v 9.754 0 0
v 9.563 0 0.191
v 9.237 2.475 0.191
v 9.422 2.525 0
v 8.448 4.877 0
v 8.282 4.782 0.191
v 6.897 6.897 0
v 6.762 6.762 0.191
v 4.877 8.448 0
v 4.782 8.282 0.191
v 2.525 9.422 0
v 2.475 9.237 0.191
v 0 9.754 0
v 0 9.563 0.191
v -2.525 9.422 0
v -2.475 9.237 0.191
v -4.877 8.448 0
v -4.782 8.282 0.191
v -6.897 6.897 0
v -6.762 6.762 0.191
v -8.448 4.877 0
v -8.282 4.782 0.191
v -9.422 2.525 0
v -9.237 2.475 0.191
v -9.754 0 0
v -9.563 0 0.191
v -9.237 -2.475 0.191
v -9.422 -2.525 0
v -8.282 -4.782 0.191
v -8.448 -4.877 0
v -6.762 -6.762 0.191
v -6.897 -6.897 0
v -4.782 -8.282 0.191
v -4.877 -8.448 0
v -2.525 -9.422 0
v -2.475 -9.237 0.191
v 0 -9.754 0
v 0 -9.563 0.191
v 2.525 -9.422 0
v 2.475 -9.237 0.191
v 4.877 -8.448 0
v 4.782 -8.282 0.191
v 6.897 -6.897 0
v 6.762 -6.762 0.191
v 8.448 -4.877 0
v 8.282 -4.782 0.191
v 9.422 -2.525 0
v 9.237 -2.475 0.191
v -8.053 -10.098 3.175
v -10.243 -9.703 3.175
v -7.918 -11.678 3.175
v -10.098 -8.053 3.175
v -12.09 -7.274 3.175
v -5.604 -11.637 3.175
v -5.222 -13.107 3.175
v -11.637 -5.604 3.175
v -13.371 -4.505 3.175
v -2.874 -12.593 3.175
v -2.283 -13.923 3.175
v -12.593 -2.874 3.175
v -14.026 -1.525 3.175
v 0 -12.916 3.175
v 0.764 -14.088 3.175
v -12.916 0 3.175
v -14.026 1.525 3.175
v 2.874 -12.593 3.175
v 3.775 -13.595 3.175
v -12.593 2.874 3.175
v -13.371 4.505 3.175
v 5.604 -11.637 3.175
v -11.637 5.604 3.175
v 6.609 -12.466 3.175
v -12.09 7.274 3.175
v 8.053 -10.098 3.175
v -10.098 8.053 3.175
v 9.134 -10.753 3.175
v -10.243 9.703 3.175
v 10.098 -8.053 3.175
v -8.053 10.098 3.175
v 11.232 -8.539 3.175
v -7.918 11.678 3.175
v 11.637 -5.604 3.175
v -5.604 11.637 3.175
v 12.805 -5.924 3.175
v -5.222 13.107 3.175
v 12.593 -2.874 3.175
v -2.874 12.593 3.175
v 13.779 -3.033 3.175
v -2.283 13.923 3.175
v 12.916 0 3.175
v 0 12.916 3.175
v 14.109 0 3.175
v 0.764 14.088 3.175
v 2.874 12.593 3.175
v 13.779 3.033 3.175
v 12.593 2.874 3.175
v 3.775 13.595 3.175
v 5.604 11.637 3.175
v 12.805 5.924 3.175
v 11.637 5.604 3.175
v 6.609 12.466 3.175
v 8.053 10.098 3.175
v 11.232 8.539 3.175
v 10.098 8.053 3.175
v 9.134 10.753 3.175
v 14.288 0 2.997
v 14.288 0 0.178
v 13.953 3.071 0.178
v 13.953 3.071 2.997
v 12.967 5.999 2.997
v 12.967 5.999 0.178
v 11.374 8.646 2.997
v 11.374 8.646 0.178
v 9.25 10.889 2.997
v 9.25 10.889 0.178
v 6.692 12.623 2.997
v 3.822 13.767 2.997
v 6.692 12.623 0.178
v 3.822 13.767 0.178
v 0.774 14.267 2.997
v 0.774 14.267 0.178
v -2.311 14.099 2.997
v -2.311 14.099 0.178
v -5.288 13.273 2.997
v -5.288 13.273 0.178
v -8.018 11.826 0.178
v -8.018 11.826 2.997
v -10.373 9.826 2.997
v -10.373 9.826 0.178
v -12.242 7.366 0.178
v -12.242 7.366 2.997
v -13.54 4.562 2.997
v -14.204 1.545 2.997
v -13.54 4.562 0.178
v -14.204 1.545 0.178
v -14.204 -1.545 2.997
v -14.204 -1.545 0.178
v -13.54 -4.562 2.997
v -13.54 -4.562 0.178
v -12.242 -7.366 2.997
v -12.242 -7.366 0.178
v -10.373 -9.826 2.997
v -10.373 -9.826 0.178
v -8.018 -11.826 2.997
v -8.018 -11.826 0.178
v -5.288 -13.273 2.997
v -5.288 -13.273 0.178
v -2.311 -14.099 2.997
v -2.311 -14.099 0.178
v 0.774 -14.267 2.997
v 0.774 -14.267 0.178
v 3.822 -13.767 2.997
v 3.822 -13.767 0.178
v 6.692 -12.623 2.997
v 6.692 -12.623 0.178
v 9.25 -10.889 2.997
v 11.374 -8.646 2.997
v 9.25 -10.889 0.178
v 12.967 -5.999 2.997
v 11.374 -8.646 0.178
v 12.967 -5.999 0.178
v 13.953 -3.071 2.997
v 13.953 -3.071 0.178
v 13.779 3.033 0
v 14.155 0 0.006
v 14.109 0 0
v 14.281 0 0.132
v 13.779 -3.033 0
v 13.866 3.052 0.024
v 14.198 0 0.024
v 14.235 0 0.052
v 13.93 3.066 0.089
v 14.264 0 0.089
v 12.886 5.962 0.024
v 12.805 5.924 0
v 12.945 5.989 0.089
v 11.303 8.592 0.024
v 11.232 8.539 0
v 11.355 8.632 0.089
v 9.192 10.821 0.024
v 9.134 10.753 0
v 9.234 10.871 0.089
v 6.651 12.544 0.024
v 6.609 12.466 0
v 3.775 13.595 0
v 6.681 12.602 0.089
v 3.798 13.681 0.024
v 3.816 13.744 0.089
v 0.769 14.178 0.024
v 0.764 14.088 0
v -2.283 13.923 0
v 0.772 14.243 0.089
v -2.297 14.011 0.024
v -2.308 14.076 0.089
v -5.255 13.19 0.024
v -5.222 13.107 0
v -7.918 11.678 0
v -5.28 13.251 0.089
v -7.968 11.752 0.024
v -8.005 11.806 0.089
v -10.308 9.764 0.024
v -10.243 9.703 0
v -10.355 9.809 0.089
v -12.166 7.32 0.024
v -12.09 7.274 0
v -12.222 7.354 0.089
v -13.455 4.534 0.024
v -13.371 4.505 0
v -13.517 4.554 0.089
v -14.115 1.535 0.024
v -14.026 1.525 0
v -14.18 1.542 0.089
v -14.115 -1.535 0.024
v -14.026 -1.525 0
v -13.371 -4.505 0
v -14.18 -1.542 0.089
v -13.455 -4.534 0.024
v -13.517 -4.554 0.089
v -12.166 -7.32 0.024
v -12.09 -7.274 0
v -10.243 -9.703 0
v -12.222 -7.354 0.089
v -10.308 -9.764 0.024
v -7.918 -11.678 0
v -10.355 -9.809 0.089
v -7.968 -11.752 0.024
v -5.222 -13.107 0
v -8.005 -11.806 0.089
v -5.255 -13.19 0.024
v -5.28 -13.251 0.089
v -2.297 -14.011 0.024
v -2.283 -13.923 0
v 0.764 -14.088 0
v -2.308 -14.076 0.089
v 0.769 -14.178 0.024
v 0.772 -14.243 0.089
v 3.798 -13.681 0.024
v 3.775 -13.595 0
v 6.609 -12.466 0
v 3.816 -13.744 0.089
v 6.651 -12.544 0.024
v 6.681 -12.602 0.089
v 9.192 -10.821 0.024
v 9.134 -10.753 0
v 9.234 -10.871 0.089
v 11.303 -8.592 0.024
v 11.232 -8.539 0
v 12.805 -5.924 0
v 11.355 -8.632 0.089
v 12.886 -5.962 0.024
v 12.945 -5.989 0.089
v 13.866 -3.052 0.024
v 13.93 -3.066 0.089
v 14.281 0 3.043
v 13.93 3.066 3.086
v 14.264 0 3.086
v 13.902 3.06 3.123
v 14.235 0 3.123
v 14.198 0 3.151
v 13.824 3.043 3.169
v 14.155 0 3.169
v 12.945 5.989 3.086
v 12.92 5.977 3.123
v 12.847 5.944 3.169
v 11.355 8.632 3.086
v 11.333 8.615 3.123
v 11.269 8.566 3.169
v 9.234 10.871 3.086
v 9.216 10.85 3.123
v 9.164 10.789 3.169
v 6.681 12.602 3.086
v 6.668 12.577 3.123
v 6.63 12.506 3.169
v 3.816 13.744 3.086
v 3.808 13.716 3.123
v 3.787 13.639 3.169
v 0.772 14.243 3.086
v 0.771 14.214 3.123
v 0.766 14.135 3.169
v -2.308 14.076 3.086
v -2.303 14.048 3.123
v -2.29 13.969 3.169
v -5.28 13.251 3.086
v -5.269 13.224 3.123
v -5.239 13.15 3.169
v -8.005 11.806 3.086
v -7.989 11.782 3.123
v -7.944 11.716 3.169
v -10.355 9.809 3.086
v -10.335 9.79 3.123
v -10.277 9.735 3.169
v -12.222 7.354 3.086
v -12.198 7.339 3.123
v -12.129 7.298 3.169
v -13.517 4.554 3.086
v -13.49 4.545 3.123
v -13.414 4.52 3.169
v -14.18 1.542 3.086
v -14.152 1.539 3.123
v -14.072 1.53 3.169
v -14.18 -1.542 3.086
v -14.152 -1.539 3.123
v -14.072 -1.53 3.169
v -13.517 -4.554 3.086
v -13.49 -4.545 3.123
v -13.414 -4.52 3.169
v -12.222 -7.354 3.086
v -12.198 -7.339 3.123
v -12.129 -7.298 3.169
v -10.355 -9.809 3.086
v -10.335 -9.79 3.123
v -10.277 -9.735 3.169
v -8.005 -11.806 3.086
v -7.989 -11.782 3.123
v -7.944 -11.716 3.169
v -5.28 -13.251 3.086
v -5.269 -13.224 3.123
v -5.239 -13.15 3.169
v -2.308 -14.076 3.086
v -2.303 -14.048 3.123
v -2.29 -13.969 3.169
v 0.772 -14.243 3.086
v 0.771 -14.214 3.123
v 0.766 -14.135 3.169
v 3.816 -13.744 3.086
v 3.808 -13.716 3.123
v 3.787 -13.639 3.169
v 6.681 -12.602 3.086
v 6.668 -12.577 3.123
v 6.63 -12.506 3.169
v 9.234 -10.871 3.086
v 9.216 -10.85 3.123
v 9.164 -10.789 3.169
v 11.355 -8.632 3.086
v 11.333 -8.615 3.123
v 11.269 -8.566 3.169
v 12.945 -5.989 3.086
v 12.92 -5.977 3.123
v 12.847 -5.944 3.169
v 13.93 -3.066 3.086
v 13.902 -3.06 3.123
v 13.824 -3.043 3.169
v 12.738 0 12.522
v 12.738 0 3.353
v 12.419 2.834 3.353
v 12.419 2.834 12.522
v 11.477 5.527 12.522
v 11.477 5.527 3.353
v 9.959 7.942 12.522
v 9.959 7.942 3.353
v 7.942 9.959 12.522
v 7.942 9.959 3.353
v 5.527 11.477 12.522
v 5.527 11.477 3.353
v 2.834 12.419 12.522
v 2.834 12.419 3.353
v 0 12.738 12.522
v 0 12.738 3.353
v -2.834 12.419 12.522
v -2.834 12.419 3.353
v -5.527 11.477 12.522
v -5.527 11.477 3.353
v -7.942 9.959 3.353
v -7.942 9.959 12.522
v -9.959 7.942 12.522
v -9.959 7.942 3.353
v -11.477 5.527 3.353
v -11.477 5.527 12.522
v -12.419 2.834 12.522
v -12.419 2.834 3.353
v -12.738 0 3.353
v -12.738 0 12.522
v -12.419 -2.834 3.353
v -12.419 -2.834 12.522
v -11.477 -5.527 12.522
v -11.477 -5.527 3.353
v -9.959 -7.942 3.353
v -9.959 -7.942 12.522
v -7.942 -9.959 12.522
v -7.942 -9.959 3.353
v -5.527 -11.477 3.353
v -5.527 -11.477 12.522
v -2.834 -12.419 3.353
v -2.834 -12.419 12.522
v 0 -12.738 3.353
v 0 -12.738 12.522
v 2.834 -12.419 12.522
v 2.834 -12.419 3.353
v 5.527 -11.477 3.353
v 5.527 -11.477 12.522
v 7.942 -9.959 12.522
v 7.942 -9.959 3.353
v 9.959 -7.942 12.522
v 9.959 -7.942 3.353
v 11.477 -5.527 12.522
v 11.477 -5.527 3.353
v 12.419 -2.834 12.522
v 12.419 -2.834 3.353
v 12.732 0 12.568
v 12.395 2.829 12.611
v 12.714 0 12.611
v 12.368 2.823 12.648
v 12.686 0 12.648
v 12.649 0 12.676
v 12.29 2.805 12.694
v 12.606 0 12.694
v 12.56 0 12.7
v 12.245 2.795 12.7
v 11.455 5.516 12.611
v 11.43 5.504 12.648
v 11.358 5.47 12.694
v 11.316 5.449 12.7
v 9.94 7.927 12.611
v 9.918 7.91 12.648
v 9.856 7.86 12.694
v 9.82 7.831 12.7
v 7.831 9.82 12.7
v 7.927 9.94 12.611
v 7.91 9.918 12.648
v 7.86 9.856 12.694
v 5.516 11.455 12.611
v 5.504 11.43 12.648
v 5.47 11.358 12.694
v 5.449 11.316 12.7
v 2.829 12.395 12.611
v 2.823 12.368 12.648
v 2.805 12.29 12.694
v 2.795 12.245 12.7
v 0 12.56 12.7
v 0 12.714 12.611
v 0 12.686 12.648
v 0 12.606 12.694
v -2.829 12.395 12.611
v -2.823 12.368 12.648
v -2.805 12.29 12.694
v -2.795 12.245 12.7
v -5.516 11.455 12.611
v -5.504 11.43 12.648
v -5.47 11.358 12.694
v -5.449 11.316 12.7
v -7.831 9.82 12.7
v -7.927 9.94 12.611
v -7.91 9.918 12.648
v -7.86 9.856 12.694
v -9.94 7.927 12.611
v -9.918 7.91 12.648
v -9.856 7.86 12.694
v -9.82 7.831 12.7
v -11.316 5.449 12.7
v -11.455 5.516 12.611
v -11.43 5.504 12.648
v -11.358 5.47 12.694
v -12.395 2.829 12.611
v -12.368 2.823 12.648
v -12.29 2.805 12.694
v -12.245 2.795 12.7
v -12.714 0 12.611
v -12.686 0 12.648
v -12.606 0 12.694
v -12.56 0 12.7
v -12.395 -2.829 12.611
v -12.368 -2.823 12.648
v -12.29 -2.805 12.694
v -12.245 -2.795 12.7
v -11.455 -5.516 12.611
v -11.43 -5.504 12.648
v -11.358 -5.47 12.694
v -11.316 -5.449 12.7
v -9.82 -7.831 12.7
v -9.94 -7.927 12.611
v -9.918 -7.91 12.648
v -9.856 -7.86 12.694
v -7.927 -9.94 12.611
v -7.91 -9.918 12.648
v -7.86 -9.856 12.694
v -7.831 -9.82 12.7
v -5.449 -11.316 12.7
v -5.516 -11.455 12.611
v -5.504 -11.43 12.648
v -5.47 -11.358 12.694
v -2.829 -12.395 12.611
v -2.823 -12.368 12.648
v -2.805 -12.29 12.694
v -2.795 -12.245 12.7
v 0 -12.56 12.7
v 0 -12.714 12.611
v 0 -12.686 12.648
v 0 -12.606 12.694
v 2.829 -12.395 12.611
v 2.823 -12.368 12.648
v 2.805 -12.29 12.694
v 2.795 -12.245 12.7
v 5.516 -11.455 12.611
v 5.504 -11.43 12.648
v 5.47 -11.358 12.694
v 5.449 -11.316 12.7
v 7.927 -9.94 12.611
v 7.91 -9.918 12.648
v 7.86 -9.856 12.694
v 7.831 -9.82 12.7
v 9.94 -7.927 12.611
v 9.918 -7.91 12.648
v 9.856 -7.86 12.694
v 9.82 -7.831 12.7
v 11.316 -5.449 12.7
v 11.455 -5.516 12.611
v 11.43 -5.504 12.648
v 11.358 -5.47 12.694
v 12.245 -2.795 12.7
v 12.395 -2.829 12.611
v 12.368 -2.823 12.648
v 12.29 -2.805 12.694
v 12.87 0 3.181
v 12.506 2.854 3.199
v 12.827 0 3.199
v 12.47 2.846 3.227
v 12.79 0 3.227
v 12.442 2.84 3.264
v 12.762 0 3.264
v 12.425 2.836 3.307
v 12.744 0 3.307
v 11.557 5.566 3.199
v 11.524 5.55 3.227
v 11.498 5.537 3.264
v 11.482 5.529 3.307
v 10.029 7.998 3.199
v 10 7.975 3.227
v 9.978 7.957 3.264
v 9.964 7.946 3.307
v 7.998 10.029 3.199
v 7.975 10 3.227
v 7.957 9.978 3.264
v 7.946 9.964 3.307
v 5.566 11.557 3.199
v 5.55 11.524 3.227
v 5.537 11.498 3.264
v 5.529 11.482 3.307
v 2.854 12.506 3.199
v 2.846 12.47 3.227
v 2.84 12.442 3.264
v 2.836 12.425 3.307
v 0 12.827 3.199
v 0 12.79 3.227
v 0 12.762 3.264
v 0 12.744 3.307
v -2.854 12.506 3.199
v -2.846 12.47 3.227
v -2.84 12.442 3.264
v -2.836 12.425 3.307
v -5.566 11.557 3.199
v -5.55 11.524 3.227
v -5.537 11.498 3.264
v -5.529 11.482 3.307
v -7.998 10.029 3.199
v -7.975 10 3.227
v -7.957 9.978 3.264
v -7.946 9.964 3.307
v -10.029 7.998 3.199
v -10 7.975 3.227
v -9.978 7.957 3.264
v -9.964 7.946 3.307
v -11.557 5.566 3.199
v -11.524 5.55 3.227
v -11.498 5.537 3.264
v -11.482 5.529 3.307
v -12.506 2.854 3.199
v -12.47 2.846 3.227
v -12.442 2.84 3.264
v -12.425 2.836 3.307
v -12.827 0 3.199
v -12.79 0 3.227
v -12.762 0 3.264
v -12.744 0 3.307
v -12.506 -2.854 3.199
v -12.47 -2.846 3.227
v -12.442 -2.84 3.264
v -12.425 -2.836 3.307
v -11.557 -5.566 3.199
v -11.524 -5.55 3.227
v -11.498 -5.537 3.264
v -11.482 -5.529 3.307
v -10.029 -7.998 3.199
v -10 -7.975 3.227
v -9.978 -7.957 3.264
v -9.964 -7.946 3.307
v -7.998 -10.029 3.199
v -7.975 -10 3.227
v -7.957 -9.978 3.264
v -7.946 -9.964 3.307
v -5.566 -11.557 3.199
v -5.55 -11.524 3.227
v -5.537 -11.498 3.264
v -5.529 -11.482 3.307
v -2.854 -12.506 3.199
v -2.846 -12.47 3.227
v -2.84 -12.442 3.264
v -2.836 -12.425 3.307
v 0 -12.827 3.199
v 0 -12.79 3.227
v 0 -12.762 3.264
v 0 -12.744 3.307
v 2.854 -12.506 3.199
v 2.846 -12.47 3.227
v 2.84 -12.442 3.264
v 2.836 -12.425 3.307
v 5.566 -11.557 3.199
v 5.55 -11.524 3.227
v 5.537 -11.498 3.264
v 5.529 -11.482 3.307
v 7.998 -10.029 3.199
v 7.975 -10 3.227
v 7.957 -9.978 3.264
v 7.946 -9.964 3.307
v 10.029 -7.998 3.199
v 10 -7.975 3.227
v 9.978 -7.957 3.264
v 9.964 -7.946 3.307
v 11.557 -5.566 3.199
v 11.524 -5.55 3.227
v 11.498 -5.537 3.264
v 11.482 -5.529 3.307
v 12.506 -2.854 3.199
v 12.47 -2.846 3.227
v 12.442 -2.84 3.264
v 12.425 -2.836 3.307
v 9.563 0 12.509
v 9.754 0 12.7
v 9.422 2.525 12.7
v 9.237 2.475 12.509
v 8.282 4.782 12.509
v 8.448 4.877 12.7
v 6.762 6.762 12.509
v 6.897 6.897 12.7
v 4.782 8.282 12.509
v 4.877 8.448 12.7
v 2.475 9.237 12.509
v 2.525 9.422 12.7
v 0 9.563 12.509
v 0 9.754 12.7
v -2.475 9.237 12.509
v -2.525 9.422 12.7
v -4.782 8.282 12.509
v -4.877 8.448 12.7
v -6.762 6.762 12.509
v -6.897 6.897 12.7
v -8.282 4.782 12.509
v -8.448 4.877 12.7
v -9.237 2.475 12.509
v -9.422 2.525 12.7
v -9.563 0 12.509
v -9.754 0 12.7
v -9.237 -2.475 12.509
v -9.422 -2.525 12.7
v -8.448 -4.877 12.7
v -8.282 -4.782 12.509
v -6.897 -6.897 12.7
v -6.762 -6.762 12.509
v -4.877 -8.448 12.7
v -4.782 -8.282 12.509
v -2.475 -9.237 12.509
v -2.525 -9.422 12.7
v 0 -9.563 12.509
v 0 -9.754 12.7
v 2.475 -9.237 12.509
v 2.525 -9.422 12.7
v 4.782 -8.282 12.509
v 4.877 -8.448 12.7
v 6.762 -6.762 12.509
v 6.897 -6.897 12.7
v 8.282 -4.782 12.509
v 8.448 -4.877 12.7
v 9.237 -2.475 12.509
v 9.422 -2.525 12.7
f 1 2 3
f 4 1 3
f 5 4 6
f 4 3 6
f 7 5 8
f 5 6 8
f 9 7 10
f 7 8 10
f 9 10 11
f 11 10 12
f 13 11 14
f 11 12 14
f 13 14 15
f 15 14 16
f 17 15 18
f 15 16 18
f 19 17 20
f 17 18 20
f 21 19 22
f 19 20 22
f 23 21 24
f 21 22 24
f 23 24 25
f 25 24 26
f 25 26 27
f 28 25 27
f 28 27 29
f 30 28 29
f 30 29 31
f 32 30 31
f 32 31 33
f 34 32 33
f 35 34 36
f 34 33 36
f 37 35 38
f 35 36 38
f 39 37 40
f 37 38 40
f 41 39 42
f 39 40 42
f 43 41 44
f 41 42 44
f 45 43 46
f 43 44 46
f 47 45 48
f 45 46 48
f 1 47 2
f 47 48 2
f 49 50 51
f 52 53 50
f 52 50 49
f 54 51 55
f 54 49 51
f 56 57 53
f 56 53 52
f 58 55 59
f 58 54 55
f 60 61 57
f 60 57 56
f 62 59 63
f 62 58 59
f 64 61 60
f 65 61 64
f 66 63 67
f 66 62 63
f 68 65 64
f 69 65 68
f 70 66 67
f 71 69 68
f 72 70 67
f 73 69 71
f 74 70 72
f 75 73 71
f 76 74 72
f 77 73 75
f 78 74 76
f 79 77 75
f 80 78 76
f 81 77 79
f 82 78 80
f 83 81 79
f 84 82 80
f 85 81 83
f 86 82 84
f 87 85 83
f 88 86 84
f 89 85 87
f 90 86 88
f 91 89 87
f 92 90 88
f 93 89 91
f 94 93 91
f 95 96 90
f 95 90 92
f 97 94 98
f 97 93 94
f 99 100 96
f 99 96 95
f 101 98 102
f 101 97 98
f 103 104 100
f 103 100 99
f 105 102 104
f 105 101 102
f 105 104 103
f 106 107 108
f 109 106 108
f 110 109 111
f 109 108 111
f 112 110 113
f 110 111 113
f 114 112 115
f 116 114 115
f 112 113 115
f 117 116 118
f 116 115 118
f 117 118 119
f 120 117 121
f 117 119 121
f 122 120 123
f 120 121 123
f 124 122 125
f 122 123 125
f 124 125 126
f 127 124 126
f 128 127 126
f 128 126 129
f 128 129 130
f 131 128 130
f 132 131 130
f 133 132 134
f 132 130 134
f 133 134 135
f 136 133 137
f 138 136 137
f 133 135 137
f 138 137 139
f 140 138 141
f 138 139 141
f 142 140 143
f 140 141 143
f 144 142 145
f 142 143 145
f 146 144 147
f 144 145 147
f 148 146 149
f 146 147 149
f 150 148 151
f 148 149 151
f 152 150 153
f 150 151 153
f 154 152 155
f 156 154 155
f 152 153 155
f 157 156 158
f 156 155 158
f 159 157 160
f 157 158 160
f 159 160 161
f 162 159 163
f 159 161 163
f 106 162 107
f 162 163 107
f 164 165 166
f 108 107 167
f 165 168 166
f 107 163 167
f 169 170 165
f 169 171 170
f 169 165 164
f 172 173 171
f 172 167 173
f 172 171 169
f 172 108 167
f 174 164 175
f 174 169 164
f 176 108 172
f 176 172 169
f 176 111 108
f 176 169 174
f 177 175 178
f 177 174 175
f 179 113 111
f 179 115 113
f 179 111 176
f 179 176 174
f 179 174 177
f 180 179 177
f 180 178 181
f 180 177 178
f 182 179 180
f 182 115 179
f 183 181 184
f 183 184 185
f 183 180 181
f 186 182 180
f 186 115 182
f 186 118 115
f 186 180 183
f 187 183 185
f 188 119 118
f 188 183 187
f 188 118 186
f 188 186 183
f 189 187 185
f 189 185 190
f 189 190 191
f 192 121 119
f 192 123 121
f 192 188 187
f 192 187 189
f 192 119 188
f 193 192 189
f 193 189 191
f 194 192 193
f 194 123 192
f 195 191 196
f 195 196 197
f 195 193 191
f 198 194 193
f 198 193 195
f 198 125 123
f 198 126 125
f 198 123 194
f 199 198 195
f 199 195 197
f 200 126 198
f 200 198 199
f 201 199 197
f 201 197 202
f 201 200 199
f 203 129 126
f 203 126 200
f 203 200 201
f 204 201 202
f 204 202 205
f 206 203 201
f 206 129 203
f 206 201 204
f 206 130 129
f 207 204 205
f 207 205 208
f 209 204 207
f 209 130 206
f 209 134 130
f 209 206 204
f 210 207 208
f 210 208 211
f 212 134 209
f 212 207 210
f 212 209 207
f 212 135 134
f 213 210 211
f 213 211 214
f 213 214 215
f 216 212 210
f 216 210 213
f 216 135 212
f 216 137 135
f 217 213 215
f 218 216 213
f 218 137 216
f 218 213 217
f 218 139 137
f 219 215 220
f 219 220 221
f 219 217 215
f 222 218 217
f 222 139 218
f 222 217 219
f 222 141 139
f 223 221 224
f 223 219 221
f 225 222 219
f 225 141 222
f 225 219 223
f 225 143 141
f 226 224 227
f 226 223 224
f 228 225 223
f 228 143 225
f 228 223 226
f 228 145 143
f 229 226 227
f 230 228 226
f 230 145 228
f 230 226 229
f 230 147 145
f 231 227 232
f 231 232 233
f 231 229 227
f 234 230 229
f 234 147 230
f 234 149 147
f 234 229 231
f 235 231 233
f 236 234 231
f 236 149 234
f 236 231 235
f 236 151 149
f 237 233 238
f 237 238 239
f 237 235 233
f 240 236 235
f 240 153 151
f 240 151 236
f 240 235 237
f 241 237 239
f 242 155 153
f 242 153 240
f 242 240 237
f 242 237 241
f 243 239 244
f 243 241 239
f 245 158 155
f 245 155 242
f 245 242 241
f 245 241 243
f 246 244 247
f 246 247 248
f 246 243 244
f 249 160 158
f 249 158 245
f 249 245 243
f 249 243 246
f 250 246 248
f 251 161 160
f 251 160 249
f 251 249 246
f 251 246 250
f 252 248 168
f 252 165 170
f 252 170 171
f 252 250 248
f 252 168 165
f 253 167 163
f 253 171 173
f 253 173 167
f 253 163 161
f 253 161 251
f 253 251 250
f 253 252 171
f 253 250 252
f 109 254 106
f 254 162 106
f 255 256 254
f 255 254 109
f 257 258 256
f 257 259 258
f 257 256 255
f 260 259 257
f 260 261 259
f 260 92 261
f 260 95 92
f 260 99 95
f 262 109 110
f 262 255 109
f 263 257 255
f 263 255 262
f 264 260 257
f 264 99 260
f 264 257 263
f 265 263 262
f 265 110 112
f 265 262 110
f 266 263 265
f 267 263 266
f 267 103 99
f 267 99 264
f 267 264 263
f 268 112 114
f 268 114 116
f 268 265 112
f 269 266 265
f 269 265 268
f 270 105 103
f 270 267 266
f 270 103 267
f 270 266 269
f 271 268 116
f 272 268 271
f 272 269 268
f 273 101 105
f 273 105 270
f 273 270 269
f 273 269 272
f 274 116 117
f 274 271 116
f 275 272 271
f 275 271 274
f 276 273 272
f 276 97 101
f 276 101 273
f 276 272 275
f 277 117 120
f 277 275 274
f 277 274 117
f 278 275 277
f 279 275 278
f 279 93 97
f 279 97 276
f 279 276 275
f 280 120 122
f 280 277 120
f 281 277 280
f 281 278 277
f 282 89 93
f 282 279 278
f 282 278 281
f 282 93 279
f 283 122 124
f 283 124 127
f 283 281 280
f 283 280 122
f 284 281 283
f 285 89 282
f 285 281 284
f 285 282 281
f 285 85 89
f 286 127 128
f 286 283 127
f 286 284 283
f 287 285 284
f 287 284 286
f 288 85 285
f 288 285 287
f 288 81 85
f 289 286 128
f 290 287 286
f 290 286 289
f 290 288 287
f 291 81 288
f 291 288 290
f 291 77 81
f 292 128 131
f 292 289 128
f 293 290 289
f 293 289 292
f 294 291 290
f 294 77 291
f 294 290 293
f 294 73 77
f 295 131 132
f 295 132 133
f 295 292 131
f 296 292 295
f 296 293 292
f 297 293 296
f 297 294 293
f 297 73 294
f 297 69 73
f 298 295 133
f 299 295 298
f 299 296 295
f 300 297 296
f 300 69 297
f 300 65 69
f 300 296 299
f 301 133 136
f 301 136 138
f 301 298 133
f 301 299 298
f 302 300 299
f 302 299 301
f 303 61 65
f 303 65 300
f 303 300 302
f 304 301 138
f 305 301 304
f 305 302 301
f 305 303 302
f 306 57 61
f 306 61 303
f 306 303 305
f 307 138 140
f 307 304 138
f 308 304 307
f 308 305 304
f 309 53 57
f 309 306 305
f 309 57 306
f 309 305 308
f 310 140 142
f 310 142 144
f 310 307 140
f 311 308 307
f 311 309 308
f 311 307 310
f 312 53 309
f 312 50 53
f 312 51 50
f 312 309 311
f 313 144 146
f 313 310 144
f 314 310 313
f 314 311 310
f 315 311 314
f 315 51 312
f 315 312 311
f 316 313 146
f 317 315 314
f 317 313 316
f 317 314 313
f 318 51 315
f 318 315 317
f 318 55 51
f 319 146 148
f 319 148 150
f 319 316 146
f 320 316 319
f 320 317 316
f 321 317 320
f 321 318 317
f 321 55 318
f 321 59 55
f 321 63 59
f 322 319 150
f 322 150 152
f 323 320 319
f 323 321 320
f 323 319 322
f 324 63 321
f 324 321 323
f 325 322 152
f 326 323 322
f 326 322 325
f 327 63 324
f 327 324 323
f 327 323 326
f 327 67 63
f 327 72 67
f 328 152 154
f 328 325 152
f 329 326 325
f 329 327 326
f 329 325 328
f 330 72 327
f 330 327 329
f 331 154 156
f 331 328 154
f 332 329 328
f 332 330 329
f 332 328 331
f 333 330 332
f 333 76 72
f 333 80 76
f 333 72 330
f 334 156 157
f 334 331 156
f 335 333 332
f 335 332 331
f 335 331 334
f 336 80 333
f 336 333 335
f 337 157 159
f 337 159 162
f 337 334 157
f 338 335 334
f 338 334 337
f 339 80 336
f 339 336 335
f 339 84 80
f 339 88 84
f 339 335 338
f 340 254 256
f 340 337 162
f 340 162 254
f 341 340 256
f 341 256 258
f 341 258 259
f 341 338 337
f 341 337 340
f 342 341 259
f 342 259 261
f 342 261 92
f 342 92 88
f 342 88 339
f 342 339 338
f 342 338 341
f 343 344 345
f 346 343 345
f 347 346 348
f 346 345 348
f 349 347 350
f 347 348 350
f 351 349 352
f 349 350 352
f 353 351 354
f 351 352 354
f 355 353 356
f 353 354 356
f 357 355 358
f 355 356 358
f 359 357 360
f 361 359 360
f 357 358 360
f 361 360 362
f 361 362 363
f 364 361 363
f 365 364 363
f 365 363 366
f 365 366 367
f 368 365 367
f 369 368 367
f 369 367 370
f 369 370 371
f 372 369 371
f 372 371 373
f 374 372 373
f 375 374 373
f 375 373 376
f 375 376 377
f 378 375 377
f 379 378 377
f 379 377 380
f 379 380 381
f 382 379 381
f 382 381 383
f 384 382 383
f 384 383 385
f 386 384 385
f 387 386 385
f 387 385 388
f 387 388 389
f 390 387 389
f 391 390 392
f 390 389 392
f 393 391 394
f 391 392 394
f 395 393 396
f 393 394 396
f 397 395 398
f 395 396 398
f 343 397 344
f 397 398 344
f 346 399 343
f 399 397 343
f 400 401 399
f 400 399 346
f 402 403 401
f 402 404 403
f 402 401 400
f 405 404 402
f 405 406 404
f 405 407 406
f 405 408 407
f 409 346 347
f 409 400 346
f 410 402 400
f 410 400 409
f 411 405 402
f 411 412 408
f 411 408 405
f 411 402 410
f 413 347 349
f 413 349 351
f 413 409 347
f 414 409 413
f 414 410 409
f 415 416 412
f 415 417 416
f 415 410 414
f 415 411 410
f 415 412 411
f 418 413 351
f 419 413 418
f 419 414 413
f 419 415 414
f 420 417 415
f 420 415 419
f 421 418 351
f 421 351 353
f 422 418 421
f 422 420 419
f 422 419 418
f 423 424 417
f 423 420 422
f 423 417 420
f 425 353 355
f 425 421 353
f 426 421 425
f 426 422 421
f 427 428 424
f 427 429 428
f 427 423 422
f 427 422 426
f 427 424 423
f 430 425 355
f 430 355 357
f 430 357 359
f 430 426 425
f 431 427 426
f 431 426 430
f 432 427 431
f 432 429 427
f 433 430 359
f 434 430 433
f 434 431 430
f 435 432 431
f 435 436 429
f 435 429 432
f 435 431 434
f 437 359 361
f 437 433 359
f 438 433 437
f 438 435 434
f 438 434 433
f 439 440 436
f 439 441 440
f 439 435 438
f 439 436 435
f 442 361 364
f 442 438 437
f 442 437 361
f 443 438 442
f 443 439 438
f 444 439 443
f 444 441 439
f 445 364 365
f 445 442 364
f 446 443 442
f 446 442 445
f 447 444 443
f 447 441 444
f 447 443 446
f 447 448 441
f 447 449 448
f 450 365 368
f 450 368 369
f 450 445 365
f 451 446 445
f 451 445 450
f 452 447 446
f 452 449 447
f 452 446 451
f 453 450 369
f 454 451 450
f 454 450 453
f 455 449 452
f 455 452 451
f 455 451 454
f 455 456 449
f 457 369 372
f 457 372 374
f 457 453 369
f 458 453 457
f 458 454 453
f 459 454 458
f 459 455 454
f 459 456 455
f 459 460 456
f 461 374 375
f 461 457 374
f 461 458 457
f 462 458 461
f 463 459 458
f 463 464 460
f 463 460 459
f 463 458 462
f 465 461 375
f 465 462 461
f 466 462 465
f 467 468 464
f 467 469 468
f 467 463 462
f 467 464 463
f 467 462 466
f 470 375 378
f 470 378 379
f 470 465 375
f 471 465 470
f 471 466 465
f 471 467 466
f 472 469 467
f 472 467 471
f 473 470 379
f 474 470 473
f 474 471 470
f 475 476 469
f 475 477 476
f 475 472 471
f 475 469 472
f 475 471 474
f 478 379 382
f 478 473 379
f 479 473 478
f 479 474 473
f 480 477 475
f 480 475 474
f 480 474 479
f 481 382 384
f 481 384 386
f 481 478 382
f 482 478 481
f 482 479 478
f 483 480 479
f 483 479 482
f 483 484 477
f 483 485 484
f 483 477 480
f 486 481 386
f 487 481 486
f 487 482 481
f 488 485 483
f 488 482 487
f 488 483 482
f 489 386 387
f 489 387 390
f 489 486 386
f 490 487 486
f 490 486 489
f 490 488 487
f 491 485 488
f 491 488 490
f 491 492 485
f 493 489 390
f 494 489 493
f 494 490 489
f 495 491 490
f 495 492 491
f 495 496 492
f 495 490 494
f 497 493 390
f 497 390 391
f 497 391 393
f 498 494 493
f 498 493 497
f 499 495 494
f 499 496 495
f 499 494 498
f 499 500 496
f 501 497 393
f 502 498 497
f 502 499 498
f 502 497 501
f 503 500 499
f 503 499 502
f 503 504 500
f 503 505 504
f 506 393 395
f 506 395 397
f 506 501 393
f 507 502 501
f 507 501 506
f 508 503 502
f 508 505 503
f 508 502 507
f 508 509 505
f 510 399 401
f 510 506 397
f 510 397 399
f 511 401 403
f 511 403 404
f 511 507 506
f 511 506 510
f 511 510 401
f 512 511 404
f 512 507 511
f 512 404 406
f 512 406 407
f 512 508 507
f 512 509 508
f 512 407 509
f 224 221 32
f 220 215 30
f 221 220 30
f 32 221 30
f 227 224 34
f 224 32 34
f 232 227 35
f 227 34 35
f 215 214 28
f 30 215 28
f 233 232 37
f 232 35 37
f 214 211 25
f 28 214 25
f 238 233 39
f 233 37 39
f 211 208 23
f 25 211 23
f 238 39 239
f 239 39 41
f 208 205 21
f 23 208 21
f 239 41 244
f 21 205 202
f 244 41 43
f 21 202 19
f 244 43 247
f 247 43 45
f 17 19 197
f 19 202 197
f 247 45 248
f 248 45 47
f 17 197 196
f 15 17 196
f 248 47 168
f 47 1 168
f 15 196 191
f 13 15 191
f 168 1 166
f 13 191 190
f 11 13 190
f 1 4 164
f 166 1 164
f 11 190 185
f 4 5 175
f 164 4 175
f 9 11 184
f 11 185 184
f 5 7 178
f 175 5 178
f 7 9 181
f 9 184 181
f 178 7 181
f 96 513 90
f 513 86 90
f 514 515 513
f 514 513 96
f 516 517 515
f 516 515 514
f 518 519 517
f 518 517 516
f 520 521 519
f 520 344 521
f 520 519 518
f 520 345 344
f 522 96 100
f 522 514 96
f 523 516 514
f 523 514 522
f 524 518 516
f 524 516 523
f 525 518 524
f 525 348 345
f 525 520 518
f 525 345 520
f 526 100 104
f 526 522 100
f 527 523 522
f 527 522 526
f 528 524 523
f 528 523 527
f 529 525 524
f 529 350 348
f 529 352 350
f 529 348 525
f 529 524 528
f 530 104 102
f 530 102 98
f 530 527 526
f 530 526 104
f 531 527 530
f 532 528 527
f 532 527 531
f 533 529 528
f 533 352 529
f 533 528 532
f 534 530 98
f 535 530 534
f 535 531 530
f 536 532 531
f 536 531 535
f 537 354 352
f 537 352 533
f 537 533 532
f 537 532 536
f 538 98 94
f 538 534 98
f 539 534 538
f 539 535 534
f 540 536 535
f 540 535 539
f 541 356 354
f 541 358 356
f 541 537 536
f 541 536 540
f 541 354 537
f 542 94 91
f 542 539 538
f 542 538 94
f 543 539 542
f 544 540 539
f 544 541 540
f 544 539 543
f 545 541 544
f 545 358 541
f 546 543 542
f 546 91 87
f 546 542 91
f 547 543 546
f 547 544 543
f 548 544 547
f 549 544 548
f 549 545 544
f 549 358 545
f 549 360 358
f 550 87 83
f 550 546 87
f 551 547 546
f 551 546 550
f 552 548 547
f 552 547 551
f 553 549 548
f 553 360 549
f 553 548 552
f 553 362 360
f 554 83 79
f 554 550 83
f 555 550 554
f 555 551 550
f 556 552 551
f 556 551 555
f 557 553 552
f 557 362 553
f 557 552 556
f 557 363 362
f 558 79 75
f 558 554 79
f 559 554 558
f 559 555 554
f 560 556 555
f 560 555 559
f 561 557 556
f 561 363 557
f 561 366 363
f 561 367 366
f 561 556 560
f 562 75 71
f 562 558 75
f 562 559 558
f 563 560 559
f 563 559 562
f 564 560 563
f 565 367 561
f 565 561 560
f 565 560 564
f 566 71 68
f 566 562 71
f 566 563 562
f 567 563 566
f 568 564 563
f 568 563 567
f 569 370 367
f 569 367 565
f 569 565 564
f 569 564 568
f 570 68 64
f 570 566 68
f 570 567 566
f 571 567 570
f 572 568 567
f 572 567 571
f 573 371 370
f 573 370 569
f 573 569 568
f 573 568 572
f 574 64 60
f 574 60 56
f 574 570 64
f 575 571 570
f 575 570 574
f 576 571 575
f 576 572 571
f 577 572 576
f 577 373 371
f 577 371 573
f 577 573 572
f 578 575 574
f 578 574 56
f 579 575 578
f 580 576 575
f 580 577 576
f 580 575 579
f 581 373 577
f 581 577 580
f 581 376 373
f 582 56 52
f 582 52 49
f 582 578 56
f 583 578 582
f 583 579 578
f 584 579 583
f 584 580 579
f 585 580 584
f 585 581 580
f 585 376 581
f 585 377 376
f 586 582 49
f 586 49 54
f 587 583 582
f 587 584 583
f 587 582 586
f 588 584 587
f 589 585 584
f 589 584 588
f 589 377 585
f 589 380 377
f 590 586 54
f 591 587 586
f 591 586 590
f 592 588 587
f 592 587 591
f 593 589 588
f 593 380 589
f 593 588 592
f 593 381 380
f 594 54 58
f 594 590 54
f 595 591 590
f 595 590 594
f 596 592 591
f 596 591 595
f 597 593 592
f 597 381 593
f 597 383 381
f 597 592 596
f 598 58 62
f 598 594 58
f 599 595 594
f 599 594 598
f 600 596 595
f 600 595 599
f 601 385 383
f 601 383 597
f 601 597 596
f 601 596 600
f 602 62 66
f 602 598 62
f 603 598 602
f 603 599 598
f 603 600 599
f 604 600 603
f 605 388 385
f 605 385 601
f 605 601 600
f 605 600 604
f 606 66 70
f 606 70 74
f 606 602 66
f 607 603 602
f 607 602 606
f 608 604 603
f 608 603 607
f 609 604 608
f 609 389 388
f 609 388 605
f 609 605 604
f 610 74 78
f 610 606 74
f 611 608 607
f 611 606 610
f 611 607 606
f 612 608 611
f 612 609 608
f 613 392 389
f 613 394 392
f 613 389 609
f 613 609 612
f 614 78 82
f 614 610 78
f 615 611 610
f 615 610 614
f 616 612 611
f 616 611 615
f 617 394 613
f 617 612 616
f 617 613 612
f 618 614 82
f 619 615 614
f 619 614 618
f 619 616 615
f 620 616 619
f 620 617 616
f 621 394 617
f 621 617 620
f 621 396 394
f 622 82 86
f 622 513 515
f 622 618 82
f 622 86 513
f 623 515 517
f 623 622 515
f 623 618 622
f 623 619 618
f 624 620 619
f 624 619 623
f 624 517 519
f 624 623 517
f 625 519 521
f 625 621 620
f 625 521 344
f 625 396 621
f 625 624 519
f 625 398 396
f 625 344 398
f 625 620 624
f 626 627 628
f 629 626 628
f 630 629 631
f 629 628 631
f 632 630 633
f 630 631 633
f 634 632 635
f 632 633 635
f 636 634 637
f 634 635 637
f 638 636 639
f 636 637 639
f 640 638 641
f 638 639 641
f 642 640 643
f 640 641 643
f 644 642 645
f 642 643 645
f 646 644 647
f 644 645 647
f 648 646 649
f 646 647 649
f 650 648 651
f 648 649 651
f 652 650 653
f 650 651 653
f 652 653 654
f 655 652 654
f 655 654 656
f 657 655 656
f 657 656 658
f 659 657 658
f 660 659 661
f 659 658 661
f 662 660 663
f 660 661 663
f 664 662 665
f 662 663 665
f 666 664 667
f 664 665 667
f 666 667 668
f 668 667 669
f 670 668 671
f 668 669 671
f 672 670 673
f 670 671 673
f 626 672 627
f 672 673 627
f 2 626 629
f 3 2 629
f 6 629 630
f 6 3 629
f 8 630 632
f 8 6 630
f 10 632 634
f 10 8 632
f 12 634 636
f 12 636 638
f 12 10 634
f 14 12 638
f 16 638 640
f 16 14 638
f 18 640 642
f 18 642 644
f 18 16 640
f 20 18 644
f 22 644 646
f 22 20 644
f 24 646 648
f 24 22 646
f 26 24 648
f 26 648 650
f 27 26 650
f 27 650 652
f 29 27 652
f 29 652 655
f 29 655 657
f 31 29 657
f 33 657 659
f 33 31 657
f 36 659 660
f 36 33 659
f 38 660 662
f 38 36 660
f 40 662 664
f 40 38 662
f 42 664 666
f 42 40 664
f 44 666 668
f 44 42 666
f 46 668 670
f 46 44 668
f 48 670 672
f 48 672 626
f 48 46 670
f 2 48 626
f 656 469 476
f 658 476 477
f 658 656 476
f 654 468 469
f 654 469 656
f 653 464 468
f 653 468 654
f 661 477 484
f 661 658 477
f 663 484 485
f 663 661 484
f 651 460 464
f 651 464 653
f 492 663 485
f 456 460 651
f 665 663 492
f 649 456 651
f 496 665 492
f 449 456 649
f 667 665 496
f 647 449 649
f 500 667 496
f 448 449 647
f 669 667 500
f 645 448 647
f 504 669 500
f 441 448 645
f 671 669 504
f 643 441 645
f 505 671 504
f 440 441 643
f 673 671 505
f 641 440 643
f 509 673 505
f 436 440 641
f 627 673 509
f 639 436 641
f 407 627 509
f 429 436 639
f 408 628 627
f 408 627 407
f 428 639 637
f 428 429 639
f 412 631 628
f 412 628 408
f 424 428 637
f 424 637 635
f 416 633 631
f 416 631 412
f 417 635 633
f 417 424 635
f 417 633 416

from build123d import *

# Parameters (mm, degrees)
SKETCH3_R           = 12.7381
SKETCH3_R_2         = 9.5631
BOSS_EXTRUDE1_DEPTH = 12.7
SKETCH4_R           = 14.2875
SKETCH4_R_2         = 12.7381
BOSS_EXTRUDE2_DEPTH = 3.175
CHAMFER1_SIZE       = 0.191262
FILLET1_R           = 0.1783334


with BuildPart() as part:
    # Sketch3 → Boss-Extrude1 (new body)
    with BuildSketch(Plane.XY):
        Circle(SKETCH3_R)
        Circle(SKETCH3_R_2, mode=Mode.SUBTRACT)
    extrude(amount=BOSS_EXTRUDE1_DEPTH)

    # Sketch4 → Boss-Extrude2 (add)
    with BuildSketch(Plane.XY):
        Circle(SKETCH4_R)
        Circle(SKETCH4_R_2, mode=Mode.SUBTRACT)
    extrude(amount=BOSS_EXTRUDE2_DEPTH)

    # Chamfer1
    chamfer1_edges = [part.edges().sort_by_distance(p)[0] for p in [
        (-9.5631, 0, 0),
        (-9.5631, 0, 12.7),
    ]]
    chamfer(chamfer1_edges, length=CHAMFER1_SIZE)

    # Fillet1
    fillet1_edges = [part.edges().sort_by_distance(p)[0] for p in [
        (-14.2875, 0, 3.175),
        (-14.2875, 0, 0),
        (-12.7381, 0, 3.175),
        (-12.7381, 0, 12.7),
    ]]
    fillet(fillet1_edges, radius=FILLET1_R)


solid = part.part
